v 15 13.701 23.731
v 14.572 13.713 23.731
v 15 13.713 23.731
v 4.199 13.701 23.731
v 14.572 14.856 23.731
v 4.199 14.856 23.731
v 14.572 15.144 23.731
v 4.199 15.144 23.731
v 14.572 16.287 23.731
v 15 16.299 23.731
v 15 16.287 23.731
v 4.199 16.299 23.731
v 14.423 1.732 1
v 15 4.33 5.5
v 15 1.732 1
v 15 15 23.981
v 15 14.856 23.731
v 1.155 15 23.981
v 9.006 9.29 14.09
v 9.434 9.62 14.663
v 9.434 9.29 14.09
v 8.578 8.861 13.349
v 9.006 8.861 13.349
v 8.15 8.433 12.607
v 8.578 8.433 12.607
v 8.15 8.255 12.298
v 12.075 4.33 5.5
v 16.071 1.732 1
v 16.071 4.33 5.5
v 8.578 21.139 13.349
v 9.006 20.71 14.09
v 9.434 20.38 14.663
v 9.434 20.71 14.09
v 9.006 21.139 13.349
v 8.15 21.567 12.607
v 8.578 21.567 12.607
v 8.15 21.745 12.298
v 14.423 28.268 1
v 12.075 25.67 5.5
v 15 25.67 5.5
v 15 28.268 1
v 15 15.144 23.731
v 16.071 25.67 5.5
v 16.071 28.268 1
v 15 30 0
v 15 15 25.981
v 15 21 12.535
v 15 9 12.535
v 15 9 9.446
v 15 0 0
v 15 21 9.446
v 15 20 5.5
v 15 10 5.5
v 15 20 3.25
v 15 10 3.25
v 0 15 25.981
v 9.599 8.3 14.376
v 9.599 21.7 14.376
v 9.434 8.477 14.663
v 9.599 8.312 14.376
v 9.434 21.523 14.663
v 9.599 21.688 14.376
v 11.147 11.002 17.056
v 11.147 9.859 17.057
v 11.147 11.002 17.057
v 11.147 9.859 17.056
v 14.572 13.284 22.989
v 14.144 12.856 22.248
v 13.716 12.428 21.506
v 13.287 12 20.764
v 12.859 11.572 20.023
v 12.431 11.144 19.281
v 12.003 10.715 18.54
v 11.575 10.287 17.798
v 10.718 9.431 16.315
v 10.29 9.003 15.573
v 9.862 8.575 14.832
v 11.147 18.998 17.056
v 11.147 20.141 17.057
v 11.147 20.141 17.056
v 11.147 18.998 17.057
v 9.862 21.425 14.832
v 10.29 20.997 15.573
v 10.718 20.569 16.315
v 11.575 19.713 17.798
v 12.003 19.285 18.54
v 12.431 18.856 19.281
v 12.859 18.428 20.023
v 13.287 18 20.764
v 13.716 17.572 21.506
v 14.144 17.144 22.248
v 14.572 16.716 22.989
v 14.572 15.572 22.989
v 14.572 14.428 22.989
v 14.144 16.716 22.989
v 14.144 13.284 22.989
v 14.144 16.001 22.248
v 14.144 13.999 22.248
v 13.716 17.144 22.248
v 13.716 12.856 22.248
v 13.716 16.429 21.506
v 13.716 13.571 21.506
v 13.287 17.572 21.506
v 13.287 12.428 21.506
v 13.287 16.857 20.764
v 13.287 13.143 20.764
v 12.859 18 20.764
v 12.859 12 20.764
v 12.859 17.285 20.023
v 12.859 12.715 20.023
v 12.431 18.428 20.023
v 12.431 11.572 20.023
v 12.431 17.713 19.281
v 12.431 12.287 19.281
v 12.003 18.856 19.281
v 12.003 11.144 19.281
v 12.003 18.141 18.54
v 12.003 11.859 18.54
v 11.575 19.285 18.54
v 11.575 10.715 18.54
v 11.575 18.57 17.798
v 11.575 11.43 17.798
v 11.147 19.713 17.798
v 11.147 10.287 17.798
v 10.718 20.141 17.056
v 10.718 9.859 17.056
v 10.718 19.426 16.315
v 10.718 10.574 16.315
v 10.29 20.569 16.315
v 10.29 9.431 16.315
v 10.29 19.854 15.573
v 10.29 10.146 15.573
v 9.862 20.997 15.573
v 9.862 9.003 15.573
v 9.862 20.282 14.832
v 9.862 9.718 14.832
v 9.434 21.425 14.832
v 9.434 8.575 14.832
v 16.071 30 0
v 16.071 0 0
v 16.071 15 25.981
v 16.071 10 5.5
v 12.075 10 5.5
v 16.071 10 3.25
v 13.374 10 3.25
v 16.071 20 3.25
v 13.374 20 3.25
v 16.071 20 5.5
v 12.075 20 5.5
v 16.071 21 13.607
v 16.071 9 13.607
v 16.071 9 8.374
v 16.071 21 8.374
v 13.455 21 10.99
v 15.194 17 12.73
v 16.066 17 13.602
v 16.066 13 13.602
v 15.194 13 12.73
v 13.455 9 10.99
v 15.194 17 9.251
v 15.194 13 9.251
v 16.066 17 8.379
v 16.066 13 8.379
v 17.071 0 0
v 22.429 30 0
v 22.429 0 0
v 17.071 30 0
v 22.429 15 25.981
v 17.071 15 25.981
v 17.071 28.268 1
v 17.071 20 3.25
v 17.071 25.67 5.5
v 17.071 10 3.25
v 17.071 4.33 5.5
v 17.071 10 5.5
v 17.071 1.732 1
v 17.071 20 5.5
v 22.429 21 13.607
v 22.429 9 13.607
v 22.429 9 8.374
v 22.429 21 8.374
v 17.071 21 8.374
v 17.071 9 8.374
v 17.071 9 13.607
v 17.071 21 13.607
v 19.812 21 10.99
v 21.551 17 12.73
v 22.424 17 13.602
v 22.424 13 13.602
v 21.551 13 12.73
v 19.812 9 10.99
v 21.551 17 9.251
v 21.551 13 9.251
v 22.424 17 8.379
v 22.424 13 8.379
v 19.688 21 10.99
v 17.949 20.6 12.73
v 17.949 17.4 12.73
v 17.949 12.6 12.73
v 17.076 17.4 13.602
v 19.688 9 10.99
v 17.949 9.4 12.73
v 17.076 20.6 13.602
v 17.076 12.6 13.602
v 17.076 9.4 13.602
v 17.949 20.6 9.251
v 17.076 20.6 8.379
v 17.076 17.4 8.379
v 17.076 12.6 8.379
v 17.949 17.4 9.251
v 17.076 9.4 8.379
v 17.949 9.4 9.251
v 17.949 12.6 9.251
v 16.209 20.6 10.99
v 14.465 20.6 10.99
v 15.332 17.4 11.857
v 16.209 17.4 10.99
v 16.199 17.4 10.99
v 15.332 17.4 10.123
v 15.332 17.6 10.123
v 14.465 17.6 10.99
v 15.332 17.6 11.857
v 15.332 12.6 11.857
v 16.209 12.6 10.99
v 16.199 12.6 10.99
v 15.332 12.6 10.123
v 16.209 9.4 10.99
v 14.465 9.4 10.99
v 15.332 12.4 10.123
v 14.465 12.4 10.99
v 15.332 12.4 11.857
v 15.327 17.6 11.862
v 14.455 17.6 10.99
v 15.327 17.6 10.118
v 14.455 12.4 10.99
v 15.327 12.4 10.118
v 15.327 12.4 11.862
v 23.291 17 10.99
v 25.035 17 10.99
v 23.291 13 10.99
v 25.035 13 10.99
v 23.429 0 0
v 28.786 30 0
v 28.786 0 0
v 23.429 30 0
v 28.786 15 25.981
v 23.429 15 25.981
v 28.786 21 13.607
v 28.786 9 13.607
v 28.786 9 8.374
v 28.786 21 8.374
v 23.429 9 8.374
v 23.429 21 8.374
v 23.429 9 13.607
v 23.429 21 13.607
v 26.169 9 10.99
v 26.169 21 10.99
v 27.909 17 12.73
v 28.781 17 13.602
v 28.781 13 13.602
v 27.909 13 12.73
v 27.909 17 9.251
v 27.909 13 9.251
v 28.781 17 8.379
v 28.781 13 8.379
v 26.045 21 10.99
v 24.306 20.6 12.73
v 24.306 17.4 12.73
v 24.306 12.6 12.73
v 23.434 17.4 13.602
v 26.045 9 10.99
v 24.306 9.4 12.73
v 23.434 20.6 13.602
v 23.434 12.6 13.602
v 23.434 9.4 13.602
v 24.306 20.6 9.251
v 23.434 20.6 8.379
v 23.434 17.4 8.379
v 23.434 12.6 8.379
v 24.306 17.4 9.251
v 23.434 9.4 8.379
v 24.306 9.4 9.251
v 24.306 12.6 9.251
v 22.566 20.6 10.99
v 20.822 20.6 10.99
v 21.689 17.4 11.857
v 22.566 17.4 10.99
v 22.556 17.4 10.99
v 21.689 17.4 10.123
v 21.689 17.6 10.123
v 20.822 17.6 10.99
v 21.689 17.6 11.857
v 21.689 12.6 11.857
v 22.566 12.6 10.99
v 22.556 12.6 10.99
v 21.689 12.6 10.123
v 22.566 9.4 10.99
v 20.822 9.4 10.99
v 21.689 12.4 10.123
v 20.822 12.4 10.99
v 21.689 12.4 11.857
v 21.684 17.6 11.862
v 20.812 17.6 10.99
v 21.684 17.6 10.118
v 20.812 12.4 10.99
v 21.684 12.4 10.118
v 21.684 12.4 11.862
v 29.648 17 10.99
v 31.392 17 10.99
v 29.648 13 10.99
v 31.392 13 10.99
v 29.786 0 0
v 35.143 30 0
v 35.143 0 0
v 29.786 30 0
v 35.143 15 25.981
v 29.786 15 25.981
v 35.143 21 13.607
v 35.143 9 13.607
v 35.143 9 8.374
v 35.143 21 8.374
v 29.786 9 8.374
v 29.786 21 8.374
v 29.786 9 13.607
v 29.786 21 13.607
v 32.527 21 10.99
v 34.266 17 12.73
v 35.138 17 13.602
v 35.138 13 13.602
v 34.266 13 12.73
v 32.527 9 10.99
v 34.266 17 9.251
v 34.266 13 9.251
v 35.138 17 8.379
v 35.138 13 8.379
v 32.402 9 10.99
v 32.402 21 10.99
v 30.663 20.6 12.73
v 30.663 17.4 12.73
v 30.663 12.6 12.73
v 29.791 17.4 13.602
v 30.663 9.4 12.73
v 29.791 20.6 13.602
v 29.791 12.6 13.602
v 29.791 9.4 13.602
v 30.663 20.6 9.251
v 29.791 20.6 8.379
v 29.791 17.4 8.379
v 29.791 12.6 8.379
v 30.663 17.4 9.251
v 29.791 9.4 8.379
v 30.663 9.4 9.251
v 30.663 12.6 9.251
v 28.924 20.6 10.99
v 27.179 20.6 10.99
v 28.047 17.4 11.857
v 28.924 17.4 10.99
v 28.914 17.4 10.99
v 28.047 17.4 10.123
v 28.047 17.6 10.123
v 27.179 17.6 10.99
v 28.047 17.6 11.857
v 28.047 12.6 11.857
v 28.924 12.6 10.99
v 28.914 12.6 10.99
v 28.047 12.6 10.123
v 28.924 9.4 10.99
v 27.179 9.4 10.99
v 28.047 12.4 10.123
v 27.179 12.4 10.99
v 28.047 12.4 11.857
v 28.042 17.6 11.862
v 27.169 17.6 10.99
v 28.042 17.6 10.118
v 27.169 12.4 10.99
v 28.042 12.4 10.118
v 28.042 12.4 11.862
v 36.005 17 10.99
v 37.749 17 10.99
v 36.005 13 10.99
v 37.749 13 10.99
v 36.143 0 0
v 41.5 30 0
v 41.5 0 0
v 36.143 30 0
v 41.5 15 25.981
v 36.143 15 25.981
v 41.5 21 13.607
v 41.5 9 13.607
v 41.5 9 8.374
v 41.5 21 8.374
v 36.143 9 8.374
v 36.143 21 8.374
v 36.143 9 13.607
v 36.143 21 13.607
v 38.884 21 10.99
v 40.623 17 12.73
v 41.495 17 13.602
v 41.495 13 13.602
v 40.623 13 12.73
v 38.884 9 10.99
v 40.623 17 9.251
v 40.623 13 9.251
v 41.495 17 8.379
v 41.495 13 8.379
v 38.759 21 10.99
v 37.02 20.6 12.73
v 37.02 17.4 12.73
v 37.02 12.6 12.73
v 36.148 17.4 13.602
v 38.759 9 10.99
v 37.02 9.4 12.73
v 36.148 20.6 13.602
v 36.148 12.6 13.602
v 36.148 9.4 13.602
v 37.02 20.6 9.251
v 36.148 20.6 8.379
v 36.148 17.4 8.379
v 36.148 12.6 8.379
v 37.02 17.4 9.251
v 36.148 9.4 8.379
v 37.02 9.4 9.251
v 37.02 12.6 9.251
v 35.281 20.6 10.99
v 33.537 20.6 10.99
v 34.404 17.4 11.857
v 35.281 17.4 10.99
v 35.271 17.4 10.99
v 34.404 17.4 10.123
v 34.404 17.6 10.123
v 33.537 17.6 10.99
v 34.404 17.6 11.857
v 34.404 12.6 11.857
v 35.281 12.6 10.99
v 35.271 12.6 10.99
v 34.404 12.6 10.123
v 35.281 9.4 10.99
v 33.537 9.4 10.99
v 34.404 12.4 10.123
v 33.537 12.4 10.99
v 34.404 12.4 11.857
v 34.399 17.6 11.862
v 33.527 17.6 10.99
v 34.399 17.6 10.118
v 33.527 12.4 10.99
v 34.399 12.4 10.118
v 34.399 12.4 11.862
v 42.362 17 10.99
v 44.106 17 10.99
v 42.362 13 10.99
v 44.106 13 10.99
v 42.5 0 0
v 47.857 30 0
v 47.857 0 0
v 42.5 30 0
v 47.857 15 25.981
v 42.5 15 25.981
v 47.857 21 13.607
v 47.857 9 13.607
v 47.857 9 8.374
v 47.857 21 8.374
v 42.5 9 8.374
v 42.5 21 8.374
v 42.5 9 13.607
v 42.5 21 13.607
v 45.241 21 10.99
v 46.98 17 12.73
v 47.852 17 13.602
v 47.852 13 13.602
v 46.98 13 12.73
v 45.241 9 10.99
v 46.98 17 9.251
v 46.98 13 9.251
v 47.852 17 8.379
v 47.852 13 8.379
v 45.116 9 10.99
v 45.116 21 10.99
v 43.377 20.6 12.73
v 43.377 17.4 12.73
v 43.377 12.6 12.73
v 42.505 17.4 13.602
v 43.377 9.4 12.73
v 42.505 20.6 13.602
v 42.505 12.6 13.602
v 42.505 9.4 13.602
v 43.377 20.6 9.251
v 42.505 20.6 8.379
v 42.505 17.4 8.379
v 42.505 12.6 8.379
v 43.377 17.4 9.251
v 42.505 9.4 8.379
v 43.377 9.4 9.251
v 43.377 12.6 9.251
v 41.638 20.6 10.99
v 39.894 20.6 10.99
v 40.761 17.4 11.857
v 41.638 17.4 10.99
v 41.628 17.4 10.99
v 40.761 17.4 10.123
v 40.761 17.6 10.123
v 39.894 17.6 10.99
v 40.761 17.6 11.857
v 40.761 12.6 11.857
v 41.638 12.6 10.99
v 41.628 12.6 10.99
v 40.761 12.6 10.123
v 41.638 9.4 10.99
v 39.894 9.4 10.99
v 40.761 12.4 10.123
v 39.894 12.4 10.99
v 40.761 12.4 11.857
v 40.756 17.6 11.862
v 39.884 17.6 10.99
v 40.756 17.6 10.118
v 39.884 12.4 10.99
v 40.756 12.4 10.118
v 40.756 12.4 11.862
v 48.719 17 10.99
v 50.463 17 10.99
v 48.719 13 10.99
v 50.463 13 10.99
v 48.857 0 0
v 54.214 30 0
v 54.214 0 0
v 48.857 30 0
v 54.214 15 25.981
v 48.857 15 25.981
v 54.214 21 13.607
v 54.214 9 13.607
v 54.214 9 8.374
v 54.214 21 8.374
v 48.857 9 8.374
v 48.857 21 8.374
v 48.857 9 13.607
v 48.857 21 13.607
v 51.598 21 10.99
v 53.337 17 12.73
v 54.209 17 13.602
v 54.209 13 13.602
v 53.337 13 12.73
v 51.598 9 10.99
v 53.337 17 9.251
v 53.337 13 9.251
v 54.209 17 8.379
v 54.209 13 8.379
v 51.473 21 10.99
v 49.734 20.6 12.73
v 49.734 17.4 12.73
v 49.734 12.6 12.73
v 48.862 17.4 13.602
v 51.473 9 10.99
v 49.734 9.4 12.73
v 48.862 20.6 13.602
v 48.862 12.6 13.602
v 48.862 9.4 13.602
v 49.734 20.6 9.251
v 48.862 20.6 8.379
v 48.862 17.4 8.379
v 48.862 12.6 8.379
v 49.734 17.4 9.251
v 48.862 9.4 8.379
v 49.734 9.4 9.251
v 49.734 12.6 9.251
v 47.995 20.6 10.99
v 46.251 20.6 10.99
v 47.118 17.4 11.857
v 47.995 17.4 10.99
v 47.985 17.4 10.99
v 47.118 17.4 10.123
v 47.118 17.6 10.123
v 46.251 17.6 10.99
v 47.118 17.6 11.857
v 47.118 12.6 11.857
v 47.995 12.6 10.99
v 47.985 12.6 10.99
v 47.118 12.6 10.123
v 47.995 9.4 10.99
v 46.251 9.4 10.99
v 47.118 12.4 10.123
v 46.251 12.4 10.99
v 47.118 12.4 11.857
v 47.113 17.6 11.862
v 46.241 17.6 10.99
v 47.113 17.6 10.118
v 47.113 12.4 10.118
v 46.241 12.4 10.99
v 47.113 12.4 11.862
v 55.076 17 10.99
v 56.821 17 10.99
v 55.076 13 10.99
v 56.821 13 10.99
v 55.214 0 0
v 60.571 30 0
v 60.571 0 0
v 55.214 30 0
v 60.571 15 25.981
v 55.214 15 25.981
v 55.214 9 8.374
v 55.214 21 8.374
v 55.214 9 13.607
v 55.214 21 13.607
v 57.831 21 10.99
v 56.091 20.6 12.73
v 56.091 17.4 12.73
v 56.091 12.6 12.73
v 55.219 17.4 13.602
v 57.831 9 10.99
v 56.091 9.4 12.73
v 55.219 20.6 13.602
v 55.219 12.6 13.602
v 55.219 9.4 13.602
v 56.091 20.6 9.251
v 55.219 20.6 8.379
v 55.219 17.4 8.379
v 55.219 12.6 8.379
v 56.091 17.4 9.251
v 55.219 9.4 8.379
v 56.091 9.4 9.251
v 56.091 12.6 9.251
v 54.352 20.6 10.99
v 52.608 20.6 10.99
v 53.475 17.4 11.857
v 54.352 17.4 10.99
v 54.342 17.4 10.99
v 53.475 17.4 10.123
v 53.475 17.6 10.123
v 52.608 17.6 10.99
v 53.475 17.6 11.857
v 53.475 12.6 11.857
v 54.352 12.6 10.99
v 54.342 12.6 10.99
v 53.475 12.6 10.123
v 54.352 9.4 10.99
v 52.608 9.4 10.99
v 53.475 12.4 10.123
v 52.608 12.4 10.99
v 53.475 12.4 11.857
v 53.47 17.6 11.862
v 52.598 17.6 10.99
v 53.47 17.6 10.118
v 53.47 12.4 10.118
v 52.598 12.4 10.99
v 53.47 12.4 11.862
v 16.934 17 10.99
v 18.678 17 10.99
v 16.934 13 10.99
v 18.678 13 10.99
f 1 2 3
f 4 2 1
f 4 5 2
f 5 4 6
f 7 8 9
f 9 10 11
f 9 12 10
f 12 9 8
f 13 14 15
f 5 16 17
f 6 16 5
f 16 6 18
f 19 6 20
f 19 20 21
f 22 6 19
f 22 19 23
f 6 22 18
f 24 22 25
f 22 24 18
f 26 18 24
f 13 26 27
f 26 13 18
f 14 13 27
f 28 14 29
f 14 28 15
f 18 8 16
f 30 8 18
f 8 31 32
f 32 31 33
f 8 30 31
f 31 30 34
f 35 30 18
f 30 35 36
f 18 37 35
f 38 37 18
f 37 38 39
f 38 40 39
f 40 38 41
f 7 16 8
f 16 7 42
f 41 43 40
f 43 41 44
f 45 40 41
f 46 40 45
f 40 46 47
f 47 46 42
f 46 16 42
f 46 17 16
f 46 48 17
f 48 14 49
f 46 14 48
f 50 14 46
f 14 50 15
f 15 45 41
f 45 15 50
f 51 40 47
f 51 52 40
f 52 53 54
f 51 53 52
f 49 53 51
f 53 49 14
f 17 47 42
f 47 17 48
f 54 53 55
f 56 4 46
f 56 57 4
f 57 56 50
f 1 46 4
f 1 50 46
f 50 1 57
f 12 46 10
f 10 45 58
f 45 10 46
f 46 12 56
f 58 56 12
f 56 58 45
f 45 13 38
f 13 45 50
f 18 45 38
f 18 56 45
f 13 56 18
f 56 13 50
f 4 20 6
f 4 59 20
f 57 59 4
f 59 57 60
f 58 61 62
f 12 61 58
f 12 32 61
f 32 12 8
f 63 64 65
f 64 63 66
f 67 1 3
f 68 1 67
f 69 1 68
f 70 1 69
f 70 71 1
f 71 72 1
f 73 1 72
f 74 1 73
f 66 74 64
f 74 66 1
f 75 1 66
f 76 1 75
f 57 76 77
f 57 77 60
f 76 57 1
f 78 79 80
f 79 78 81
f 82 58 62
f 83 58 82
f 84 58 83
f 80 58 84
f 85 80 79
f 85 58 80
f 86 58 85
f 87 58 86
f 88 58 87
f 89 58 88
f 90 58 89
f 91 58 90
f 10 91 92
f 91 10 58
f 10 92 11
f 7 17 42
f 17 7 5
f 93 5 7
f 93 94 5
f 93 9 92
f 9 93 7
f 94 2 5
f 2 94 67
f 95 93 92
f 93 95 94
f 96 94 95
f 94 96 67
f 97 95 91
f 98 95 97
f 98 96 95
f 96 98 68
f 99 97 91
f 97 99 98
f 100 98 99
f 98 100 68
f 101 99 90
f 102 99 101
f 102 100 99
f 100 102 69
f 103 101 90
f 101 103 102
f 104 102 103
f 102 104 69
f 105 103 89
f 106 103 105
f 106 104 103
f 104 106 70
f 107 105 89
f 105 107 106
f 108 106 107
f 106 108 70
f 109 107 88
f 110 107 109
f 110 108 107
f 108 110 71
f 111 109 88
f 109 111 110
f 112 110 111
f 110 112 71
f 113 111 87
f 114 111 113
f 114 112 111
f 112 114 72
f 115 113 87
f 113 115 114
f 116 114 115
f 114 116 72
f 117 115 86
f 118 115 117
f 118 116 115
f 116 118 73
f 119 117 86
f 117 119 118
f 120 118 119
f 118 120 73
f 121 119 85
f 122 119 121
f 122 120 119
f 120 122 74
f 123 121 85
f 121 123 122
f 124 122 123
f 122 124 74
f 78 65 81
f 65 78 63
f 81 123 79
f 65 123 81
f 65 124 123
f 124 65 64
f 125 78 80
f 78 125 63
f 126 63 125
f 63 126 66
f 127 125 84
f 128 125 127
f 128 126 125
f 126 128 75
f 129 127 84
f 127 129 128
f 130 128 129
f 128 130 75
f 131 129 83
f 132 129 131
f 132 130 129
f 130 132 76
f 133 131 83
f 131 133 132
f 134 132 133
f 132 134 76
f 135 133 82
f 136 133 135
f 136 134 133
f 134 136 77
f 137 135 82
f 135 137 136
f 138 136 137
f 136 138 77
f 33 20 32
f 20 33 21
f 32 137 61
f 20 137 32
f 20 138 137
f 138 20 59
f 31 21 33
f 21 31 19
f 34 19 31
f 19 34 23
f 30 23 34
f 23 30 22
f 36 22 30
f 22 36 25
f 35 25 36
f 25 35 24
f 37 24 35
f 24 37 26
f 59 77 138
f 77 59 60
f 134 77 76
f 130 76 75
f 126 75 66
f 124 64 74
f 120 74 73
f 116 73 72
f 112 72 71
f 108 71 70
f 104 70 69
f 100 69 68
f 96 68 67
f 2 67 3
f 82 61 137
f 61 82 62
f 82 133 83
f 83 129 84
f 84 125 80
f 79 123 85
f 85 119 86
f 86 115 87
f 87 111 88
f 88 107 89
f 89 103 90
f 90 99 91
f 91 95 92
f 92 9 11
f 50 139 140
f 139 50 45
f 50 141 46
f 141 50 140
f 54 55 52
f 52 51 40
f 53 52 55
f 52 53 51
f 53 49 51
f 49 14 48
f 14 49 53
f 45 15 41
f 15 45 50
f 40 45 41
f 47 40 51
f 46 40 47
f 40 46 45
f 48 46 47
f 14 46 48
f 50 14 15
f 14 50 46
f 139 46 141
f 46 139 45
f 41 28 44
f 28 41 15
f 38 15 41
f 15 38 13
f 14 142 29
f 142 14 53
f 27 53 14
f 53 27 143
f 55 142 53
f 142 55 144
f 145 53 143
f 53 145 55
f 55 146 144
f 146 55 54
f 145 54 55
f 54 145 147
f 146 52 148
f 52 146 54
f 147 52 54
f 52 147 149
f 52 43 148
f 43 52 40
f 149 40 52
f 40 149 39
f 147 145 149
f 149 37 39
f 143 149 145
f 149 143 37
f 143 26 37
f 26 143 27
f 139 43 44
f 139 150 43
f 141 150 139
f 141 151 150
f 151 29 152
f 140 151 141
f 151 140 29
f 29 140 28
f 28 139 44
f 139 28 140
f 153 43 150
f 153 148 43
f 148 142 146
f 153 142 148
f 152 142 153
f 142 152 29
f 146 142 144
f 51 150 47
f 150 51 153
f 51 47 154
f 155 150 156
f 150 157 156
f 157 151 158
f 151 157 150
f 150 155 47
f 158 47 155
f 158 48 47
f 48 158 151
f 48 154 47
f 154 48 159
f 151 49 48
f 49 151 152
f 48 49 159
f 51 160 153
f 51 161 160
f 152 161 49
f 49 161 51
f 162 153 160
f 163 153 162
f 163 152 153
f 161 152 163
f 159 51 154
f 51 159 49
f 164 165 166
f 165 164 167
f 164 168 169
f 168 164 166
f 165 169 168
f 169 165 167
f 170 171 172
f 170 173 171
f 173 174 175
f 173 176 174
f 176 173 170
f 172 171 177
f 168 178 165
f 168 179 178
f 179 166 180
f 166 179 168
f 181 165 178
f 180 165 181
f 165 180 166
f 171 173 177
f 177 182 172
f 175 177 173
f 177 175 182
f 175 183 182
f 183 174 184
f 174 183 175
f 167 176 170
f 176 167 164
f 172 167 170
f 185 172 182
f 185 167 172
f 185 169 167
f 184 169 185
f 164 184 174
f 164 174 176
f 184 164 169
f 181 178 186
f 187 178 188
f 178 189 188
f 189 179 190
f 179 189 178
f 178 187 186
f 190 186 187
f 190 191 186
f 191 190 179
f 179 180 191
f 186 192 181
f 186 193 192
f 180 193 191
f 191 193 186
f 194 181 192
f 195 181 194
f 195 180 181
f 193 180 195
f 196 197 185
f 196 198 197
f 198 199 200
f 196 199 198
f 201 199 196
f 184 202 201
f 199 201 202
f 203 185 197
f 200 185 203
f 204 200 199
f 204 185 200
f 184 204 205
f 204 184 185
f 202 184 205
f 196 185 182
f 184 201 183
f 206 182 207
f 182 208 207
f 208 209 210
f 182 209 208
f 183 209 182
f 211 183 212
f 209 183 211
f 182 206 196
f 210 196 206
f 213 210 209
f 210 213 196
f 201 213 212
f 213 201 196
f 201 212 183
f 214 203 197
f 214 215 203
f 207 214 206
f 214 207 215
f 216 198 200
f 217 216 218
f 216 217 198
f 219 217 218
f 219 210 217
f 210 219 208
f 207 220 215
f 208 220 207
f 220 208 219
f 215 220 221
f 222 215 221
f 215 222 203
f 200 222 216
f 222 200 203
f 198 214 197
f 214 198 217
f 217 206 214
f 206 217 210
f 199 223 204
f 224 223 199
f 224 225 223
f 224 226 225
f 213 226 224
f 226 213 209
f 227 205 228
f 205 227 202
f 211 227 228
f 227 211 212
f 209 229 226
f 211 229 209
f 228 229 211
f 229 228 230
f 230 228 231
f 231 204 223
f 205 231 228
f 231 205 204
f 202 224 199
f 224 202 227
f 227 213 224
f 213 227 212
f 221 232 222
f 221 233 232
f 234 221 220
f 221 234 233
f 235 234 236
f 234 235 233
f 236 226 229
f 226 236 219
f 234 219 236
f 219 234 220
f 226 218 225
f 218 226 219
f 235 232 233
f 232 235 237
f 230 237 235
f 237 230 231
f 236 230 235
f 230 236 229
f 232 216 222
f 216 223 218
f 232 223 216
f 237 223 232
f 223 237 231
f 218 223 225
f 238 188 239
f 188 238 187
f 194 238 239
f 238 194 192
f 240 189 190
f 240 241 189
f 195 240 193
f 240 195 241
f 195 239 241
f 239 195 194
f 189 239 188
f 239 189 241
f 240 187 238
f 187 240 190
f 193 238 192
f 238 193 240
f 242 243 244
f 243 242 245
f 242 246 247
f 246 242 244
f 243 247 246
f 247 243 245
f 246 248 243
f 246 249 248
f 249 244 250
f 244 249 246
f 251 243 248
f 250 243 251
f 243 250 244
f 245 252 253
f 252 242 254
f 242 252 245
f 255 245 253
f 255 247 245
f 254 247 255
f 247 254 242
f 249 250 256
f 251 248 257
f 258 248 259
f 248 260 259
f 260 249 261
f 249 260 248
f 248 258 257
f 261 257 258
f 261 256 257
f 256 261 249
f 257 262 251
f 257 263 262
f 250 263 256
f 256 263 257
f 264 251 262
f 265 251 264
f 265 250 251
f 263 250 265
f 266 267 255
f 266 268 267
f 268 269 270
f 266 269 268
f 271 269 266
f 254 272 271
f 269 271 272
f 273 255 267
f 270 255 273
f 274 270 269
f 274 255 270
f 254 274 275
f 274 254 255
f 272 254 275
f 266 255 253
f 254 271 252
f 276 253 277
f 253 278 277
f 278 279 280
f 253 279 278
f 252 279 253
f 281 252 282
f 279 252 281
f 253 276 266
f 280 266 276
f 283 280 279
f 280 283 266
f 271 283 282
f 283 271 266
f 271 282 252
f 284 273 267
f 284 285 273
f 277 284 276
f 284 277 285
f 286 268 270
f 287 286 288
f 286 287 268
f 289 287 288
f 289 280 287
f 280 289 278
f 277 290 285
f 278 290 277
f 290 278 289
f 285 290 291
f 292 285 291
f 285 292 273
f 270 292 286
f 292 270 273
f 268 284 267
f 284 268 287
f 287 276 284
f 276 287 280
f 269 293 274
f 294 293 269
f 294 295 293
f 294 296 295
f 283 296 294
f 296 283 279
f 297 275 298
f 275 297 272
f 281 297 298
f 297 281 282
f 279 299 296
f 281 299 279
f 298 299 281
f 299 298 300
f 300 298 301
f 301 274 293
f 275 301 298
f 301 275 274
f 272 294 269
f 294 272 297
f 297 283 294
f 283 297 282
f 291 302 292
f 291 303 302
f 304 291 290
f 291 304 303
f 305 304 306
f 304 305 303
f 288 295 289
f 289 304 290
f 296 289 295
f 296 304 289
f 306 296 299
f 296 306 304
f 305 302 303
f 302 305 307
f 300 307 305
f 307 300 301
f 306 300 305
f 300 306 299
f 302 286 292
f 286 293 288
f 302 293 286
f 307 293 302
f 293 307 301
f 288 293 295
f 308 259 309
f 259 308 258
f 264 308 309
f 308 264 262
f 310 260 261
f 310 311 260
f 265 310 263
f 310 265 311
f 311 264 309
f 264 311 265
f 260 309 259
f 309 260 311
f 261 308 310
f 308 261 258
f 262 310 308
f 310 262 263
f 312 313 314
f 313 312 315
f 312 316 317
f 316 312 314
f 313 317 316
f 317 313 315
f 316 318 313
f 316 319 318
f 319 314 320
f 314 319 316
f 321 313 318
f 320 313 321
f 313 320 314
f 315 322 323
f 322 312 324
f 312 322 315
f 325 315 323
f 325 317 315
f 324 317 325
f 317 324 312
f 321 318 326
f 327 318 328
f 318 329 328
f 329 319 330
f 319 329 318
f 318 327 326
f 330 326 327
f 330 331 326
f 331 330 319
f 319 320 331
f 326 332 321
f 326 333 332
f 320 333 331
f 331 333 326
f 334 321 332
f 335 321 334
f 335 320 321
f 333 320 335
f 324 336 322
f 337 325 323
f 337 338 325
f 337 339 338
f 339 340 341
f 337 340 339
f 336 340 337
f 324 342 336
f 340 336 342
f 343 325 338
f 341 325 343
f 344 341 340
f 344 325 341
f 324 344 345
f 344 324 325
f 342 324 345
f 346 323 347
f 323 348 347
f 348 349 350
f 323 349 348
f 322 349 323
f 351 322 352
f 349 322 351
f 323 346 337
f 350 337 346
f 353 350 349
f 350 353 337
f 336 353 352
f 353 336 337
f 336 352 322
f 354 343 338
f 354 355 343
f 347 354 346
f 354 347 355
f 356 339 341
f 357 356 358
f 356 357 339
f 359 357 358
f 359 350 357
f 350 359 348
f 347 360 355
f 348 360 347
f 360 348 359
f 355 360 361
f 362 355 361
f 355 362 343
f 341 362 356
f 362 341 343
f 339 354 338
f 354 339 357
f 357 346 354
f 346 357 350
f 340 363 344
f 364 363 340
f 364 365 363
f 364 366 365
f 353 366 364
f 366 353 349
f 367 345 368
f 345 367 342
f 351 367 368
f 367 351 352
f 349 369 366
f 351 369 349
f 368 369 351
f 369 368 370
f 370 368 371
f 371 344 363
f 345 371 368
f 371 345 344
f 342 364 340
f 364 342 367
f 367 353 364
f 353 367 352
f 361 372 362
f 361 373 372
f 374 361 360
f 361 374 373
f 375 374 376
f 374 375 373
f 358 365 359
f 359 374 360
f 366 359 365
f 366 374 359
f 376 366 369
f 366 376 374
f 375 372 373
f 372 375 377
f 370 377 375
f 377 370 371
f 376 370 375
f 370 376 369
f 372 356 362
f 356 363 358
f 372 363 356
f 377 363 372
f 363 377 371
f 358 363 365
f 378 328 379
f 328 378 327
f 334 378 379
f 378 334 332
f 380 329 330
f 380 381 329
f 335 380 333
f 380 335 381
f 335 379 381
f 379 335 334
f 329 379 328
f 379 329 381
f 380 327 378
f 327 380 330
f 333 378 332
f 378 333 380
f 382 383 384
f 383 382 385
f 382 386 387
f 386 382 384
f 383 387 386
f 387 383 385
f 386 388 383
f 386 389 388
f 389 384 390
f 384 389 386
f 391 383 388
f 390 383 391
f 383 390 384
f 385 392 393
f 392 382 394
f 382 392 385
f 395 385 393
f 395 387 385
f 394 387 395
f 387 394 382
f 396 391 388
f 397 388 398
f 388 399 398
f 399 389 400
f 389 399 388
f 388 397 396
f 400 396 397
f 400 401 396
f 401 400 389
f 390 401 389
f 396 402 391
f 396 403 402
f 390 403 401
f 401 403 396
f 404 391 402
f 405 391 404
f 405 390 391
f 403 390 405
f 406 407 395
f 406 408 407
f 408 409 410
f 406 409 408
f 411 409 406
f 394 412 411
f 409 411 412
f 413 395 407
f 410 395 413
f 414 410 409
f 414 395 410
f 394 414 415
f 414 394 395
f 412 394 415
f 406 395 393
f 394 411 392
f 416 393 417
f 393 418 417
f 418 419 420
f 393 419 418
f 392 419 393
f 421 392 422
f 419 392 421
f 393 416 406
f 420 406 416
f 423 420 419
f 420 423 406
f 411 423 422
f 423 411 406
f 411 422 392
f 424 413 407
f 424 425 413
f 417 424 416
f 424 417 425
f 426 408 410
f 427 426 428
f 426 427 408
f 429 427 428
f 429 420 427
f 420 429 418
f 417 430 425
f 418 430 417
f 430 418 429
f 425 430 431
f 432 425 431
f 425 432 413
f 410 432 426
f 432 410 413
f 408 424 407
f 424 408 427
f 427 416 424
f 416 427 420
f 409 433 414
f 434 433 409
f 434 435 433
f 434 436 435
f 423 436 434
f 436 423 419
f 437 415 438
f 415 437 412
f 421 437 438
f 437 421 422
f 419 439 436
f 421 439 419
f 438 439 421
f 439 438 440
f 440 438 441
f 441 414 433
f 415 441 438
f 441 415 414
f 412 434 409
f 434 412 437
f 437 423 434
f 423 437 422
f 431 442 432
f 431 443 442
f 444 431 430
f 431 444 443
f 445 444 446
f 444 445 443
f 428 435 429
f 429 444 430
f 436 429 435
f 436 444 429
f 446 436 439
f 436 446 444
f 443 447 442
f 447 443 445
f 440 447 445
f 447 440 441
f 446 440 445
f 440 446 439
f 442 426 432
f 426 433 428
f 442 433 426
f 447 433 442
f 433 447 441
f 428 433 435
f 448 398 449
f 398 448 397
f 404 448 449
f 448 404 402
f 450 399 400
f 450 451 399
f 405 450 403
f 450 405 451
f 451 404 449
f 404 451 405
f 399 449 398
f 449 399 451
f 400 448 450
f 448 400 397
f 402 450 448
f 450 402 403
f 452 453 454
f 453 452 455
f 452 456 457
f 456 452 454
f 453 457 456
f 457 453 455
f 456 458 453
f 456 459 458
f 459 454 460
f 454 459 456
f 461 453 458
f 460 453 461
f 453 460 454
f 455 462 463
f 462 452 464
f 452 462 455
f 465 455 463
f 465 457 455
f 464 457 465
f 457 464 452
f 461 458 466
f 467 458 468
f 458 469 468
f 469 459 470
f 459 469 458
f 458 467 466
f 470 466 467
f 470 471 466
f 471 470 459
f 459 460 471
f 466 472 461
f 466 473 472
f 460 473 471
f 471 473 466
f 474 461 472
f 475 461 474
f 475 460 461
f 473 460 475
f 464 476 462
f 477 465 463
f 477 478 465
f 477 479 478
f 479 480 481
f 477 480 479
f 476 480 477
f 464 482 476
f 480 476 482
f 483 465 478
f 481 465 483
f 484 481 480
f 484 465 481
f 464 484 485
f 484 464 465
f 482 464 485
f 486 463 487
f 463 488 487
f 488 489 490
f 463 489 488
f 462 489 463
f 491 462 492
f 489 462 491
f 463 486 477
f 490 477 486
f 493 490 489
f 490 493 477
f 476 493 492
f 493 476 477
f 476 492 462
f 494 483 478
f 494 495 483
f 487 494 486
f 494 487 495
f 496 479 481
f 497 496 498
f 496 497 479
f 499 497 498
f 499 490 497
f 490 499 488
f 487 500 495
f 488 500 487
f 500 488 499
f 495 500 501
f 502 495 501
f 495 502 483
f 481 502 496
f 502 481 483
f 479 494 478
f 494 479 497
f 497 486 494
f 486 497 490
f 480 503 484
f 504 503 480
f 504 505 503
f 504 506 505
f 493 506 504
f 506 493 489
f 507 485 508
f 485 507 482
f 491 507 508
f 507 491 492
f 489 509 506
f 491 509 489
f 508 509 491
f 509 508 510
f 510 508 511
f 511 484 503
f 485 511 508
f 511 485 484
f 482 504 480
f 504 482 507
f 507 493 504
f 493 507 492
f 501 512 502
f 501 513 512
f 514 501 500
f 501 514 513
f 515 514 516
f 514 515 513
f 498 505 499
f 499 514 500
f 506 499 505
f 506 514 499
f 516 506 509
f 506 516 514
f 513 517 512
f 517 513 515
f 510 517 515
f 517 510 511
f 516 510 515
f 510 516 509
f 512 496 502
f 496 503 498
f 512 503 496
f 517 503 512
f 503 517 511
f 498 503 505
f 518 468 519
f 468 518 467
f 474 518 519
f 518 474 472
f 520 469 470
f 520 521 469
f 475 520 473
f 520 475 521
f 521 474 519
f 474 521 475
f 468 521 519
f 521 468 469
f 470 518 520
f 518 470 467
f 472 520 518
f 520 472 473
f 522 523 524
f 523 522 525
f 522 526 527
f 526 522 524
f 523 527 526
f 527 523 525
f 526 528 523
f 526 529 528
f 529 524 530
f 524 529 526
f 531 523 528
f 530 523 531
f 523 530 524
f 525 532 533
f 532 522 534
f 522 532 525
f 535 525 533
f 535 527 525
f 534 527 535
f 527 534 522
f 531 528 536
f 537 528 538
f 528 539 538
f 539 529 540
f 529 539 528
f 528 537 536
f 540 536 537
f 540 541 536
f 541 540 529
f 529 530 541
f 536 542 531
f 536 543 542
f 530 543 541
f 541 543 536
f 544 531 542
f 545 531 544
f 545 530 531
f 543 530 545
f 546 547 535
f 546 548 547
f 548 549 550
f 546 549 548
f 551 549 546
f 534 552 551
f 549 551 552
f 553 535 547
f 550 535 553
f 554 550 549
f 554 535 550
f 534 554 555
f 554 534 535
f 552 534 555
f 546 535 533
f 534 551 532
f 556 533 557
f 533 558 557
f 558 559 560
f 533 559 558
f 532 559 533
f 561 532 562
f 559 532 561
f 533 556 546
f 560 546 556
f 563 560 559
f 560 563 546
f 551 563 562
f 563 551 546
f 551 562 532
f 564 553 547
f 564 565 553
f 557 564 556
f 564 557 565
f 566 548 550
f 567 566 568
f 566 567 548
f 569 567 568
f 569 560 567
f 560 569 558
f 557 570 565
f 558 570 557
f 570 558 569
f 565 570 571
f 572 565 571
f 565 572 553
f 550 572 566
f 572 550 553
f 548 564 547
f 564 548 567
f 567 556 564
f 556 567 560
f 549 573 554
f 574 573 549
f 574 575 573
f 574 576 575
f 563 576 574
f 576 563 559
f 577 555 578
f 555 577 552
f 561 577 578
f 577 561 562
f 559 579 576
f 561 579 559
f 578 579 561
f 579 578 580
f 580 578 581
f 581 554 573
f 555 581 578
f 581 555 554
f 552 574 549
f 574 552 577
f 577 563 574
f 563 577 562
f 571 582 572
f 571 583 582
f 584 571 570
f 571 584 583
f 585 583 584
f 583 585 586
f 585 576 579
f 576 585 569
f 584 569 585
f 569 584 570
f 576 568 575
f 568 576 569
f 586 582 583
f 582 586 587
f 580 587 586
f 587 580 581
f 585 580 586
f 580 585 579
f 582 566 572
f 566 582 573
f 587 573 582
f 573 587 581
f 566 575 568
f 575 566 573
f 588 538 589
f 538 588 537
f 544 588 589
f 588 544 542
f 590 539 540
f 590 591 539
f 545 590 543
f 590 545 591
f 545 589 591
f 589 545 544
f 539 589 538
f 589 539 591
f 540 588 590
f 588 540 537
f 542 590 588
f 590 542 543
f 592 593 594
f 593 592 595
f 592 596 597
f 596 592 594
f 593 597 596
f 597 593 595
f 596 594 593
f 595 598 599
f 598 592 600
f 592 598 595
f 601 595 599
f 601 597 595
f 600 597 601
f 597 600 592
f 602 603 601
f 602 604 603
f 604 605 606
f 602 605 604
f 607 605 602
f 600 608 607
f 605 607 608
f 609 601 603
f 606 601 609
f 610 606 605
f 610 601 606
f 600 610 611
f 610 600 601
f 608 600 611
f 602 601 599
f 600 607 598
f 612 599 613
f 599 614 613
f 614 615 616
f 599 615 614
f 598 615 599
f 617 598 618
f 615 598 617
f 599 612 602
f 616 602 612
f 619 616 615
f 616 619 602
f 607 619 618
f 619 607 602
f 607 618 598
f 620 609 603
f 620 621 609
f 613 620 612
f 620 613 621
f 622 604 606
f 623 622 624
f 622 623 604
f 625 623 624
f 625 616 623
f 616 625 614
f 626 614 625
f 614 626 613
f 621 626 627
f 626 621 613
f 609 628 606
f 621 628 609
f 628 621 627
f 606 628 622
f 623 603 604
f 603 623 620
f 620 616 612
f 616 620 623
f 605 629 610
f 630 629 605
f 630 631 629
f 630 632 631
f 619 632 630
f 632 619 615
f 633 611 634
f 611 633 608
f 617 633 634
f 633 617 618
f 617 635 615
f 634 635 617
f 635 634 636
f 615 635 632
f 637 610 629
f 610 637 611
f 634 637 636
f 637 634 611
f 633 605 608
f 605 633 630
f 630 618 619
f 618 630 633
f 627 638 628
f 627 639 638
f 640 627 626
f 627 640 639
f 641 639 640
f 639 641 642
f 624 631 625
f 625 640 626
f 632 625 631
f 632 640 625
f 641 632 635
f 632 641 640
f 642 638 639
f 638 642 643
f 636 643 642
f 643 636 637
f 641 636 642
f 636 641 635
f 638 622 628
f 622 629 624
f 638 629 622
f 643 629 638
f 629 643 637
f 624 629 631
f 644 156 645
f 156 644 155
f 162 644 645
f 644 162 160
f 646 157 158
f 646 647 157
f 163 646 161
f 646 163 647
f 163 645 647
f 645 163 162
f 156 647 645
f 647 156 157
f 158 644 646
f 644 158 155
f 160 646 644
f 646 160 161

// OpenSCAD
// file: flexi.scad
*difference() {
    cube([25,12*2+6,7]);
    translate([15,0,0])
    rotate(90,[0,0,1])
    flexi(4, 2, 14, 2, 12, 5, 6, 7, 2.75, 1);
};

*flexi2([40,40,10], 4, 10, 10/2, 10, centers=[[0,0,0],[0,0,0]])
cube([40,40,10]);

module flexi(a, b, c, d, e, f, g, h, j, k) {
    difference() {
        // canyon
        translate([-0.01,0,-0.01])
        linear_extrude(h + 0.02)
        polygon([
        [0,0],
        [0,d],
        [e,d],
        [e,d + f],
        [e + g, d + f],
        [e + g, d],
        [e*2 + g + 0.02, d],
        [e*2 + g + 0.02, 0],
        ]);
        
        //rod-grabber
        translate([g+e-k,d+h/2,h])
        rotate(90,[0,1,0])
        rotate(180,[1,0,0])
        linear_extrude(g - k*2)
        difference() {
            square([h,f*2]);
            translate([h/2,h/2])
            circle(j);
        };
        
        // rod
        translate([e + g/2 - c/2, d, h/2])
        rotate(90,[0,1,0])
        translate([0,0,c/2])
        scale([1,0.75,1])
        translate([0,0,-c/2])
        rotate_extrude(angle= 360)
        polygon([
            [0,0],
            [b,a],
            [b,c - a],
            [0,c],
            ]);
    };
};

module flexi2(dim, steps, gap, hs, hw, center = [0,0,0], strips, centers) {
    sdim = [dim.x/steps,dim.y,dim.z];
//    hs = dim.z/2;
//    hw = dim.y/4;
    strips = (strips)?strips:[for(i =[0:sdim.x:sdim.x*steps]) i];
    for(step = [0:steps - 1]) {
        translate([step*gap,0,0])
        difference() {
            intersection() {
                children(0);
                translate([strips[step],0,0])
                cube([strips[step+1] - strips[step], sdim.y, sdim.z]);
            }
            translate(center)
            {
                // left gap
                translate((centers[step])?centers[step]:[0,0,0])
                if(step < steps - 1) {
                    translate([strips[step],0,0])
                    translate([-hs*cos(45) + strips[step + 1] - strips[step], hw*3/2 + sdim.y/2, sdim.z/2])
                    rotate(45,[0,1,0])
                    rotate(90,[1,0,0])
                    linear_extrude(hw*3)
                    square([hs,hs]);
                }
                // right gap
                translate((centers[step-1])?centers[step-1]:[0,0,0])
                if(step > 0) {
                    translate([strips[step],0,0])
                    translate([-hs*cos(45), hw*3/2 + sdim.y/2, sdim.z/2])
                    rotate(45,[0,1,0])
                    rotate(90,[1,0,0])
                    linear_extrude(hw*3)
                    square([hs,hs]);
                }
            }
        }
        translate([strips[step] + gap*step,0,0])
        translate(center) {
            // left hook
            translate((centers[step])?centers[step]:[0,0,0])
            if(step < steps - 1) {
                translate([-hs*cos(45) + strips[step + 1] - strips[step] - 0.01, hw*3/2 + sdim.y/2 - hw, sdim.z/2])
                rotate(45,[0,1,0])
                rotate(90,[1,0,0])
                linear_extrude(hw)
                difference() {
                    square([hs,hs]);
                    //translate([hs/2/2,hs/2/2])
                    square([hs/1.5,hs/1.5]);
                }
            }
            // right hooks plus bridge
            translate((centers[step-1])?centers[step-1]:[0,0,0])
            if(step > 0) {
                translate([hs*cos(45) + 0.01, hw*3/2 + sdim.y/2, sdim.z/2])
                mirror([1,0,0])
                rotate(45,[0,1,0])
                rotate(90,[1,0,0])
                translate([0,0,hw*.1])
                linear_extrude(hw*.8)
                difference() {
                    square([hs,hs]);
                    //translate([hs/2/2,hs/2/2])
                    square([hs/1.5,hs/1.5]);
                }
                translate([hs*cos(45) + 0.01, hw*3/2 + sdim.y/2 - hw*2, sdim.z/2])
                mirror([1,0,0])
                rotate(45,[0,1,0])
                rotate(90,[1,0,0])
                translate([0,0,hw*.1])
                linear_extrude(hw*.8)
                difference() {
                    square([hs,hs]);
                    //translate([hs/2/2,hs/2/2])
                    square([hs/1.5,hs/1.5]);
                }
                translate([-cos(45)*(hs - hs/1.5), hw*3/2 + sdim.y/2 - hw + hw*0.05, sdim.z/2])
                mirror([1,0,0])
                rotate(45,[0,1,0])
                rotate(90,[1,0,0])
                translate([0,0,-hw*.1])
                linear_extrude(hw*1.3)
                difference() {
                    square([hs - hs/1.5,hs - hs/1.5]);
                    //translate([hs/2/2,hs/2/2])
                    //square([hs/1.5,hs/1.5]);
                }
            }
        }
    }
    
    *translate([sdim.x - hs*cos(45), hs/2 + sdim.y/2 - hw/2, sdim.z/2])
    rotate(45,[0,1,0])
    rotate(90,[1,0,0])
    linear_extrude(hw)
    difference() {
        square([hs,hs]);
        //translate([hs/2/2,hs/2/2])
        square([hs/1.5,hs/1.5]);
    }
}
// main file
include <flexi.scad>

// handy flags
_BALCONIES = false;
_WINDOWS = false;
_VOID = false;

// floor counts
botfl = 8;

// outer wall length
length = 30;
// depth from point to back wall
depth = cos(30)*length;
// the top makes a 30 degree angle from back to the point
top_size = depth*tan(30);
top_hole_steps = 16;
top_hole_nose_inset = top_size*3/20;
top_hole_size = top_size - top_hole_nose_inset*(1+cos(30));
top_perimeter_wall = max(length/50, 1);

// floor size
fs = top_size / 2.8;

corner_whi = fs/3;
corner_win = 1.5;
corner_wout =  1.1;

void_taper = 0;
// let the taper grow up as long as we don't hit the balcony
void_taper_gains = -fs/2;
//void_taper_gains = (top_hole_nose_inset*2 - top_perimeter_wall)*tan(void_taper) - fs*0.2 - top_perimeter_wall;
//void_taper_gains = fs*0.75;


window_depth = min(top_perimeter_wall/3,.5);

echo(top_size, top_hole_size, top_hole_nose_inset, top_perimeter_wall, window_depth);

// left middle right facing point
// top down yeehaw
corners = [
    [1,"wwb"],
    [2,"bbb"],
    [3,"bww"],
    [4," w "],
    ];

// Windows by side, floor, [pos, type], pos is %, see winrow for types
windows = [
        [ 0,
            [
            [1, [[8,76],[1,69],[1,62],[7,51],[7,44],[2,35],[2,28],[7,12]
                ]],
            [2, [[4,78],[5,63],[7,55],[7,48],[7,41],[5,33],[1,22]
                ]],
            [3, [[2,83],[4,75],[5,66],[7,55],[7,48],[7,41],[1,32],[8,19]
                ]],
            [4, [[2,88],[1,80],[1,70],[2,64],[4,57],[10,50],[4,42],[1,33],[1,26],[1,18],[1,9]
                ]],
            //[4, [for (i = [0:10]) [0, 10*i+10]]],
            ],
        ],
        [ 120,
            [
            [0, [[0,20],[0,21.5],[0,23],[0,24.5],[0,26],[0,27.5],[0,29],[0,30.5],
                 [1,35],[2,38],[1,43],[3,47]
                ]],
            [1, [[4,10],[4,17],[5,23],[5,37],[5,46],[6,65],[7,82]
                ]],
            [2, [[5,21],[5,34],[4,41],[4,65],[6,76]
                ]],
            [3, [[4,14],[5,20],[5,28],[8,37],[2,46],[8,67],[1,77]
                ]],
            [4, [[1,12],[1,20],[1,31],[1,37],[2,41],[4,48],[1,65],[4,75],[6,80]
                ]],
            //[4, [for (i = [0:10]) [0, 10*i+10]]]
            ],
        ],
        [ 240,
            [
            [0, [[0,69.5],[0,71],[0,72.5],[0,74],[0,75.5],[0,77],[0,78.5],[0,80],
                 [4,61],[2,51]
                ]],
            [1, [[5,72],[2,57],[4,52],[2,32],[1,20]
                ]],
            [2, [[1,77],[4,67],[2,59],[5,51],[4,33],[6,16]
                ]],
            [3, [[9,49],[5,31],[1,20]
                ]],
            [4, [[9,49],[1,34],[1,23],[6,10]
                ]],
            //[4, [for (i = [0:10]) [0, 10*i+10]]],
            //[0, [for (i = [0:6]) [i, 10*i+10]]],
            //[1, [for (i = [0:6]) [i, 10*i+10]]]
            ],
        ]
    ];

fdim = [botfl*fs+top_size,length,length*sin(60)];
strips = concat([0],[ for(i = [top_size+fs*0.2:fs:fdim.x]) i ]);
fcenter = [0,0,-2];

echo(strips);
%cube(fdim);
flexi2(fdim, botfl, 1, 3.7, 4, strips=strips, center=fcenter)
translate([botfl*fs+top_size,0,0])
rotate(270,[0,1,0])
difference() {
    union() {
        translate([0,0,botfl*fs])
        top();
        base();
    }
    
    // top balcony
    if(true)
    color("brown")
    translate([0,0,botfl*fs - fs*0.2])
    intersection() {
        linear_extrude(top_size)
        offset(delta=-top_perimeter_wall)
        polygon([[0,0],
        [length*sin(60),length*cos(60)],
        [0,length]]);
        
        linear_extrude(top_size)
        union() {
            translate([0,length/3 * 2])
            square([top_hole_nose_inset*2 + top_perimeter_wall,length/3]);
            square([top_hole_nose_inset*2 + top_perimeter_wall,length/3]);
            square([top_hole_nose_inset + top_perimeter_wall,length]);
        };
    };
    
    // downslope to the balcony
    color("lime")
    translate([0,0,botfl*fs])
    difference() {
        linear_extrude(top_size)
        offset(delta=-top_perimeter_wall)
        polygon([[0,0],
        [length*sin(60),length*cos(60)],
        [0,length]]);
        
        translate([0,0,-top_perimeter_wall/4])
        rotate(60,[0,1,0])
        //translate([-length,0,0])
        cube([length,length,length*2]);
    };
    
    // corners
    if(_BALCONIES)
    for(c = corners) {
        translate([0,0,botfl*fs - fs*c[0]]) {
            corner(c[1][0]);
            translate([length/2/sin(60)*sin(30),length/2/sin(60)*cos(30),0])
            rotate(120,[0,0,1])
            translate([-length/2/sin(60)*sin(30),-length/2/sin(60)*cos(30),0])
            corner(c[1][1]);
            translate([length/2/sin(60)*sin(30),length/2/sin(60)*cos(30),0])
            rotate(240,[0,0,1])
            translate([-length/2/sin(60)*sin(30),-length/2/sin(60)*cos(30),0])
            corner(c[1][2]);
        }
    };
    
    // space-saving void
    if(_VOID)
    translate([0,0,-0.01])
    translate([length/2/sin(60)*sin(30) + top_hole_nose_inset,length/2/sin(60)*cos(30),0])
    //linear_extrude(botfl*fs - fs/2)
    tapertower(botfl*fs + void_taper_gains, length/sin(60)*sin(30), void_taper)
    translate([-length/2/sin(60)*sin(30) - top_hole_nose_inset,-length/2/sin(60)*cos(30),0])
    offset(r=top_perimeter_wall, $fn=20)
    offset(r=-top_perimeter_wall*2)
    polygon([
        [0,top_hole_nose_inset*corner_win],
        [0,length - top_hole_nose_inset*corner_win],
        [top_hole_nose_inset*corner_win*cos(30),
            length - top_hole_nose_inset*corner_win*sin(30)],
        [(length - top_hole_nose_inset*corner_win)*sin(60),
            (length - top_hole_nose_inset*corner_win)*cos(60) + top_hole_nose_inset*corner_win],
        [(length - top_hole_nose_inset*corner_win)*sin(60),
            (length - top_hole_nose_inset*corner_win)*cos(60)],
        [top_hole_nose_inset*corner_win*cos(30),
            top_hole_nose_inset*corner_win*sin(30)],
        ]);
        
    // windows
    if(_WINDOWS)
    for(side = windows) {
        translate([length/2/sin(60)*sin(30),length/2/sin(60)*cos(30),0])
        rotate(side[0],[0,0,1])
        translate([-length/2/sin(60)*sin(30),-length/2/sin(60)*cos(30),0])
        for(wins = side[1]) {
            translate([0,0,fs*(botfl - wins[0])])
            winrow(wins[1]);
        }
    };      
            
}

*tapertower(200, 100, 20)
square([100,100], center=true);

module tapertower(h, w, a) {
    y = w / 2 / sin(90 - a) * sin(a);
    x = h - y;
    translate([0,0,x])
    linear_extrude(y, scale=0)
    children(0);
    linear_extrude(x + 0.01)
    children(0);
}

module cube45(s) {
    *cube(s);
    x = s[1];
    y = s[2];
    z = s[0];
    xscale = max((x - z*2)/x, 0.001);
    yscale = max((y - z*2)/y, 0.001);
    if(xscale <= 0 || yscale <= 0) {
        echo(x, y, z, xscale, yscale);
    }
    rotate(90,[0,0,1])
    rotate(90,[1,0,0])
    translate([x/2, y/2])
    linear_extrude(z, scale=[xscale,yscale])
    translate([-x/2, -y/2])
    square([x,y]);
}

module winrow(ws) {
    for(w = ws) {
        t = w[0];
        pos = w[1];
        translate([0,length*pos/100,0])
        if(t == 0) { // tall thin
            translate([0,0,-fs*2/5/2])
            cube45([window_depth,length*2/400,fs*2/5]);
        } else if(t == 1) { // center narrow
            cube45([window_depth,length*7/400,fs*1/5]);
        } else if(t == 2) { // center medium
            cube45([window_depth,length*15/400,fs*1/5]);
        } else if(t == 3) { // high wide thin
            translate([0,0,fs*2/5/2])
            cube45([window_depth,length*27/400,fs*1/20]);
        } else if(t == 4) { // high narrow
            translate([0,0,fs*1/10])
            cube45([window_depth,length*7/400,fs*1/5]);
        } else if(t == 5) { // center wider
            cube45([window_depth,length*20/400,fs*1/5]);
        } else if(t == 6) { // 4 grid
            //bsize = length*4/400;
            size = fs/2;
            bsize = size/7;
            *translate([0,0,-size/2])
            cube45([window_depth,size,size]);
            translate([0,0,bsize/2])
            translate([0,0,-size/2])
            for(x = [0:bsize*2:size], y = [0:bsize*2:size]) {
                translate([0,x,y])
                cube45([window_depth,bsize,bsize]);
            }
        } else if(t == 7) { // high wider
            translate([0,0,fs*1/5/2])
            cube45([window_depth,length*23/400,fs*1/5]);
        } else if(t == 8) { // high medium
            translate([0,0,fs*1/5/2])
            cube45([window_depth,length*15/400,fs*1/5]);
        } else if(t == 9) { // 19 grid
            //bsize = length*4/400;
            size = fs/2;
            bsize = size/8;
            *translate([0,0,-size/2])
            cube45([window_depth,size,size]);
            translate([0,0,bsize/2])
            translate([0,0,-size/2])
            for(x = [0:bsize*2*.8:bsize*18*2*.8], y = [0:bsize*2:bsize*7]) {
                translate([0,x,y])
                cube45([window_depth,bsize,bsize]);
            }
        } else if(t == 10) { // DOORS
            h = fs*4/10;
            w = fs*3/10;
            translate([0,-w/2,-fs*0.2])
            cube45([window_depth,w,h]);
        }
    }
};
                        

module corner(t) {
    whi = corner_whi;
    win = corner_win;
    wout =  corner_wout;
    if(t != " ") {
        linear_extrude(whi)
        polygon([[-0.01,-0.01],
            [top_hole_nose_inset*0.8*sin(60),top_hole_nose_inset*0.8*cos(60)-0.01],
            [-0.01,top_hole_nose_inset*0.8]]);
    }
    if(t == "b") {
        linear_extrude(whi)
        polygon([[-0.01,top_hole_nose_inset*win],
            [top_hole_nose_inset*win*sin(60),top_hole_nose_inset*win*cos(60)-0.01],
            [top_hole_nose_inset*wout*sin(60),top_hole_nose_inset*wout*cos(60)-0.01],
            [-0.01,top_hole_nose_inset*wout]]);
        color("pink")
        //translate([0,0,-fs/6])
        linear_extrude(whi)
        offset(delta=-top_perimeter_wall/1.2)
        polygon([[0,0],
            [top_hole_nose_inset*win*sin(60),top_hole_nose_inset*win*cos(60)],
            [0,top_hole_nose_inset*win]]);
    }
};

module top() {
    difference() {
        color("blue")
        linear_extrude(top_size)
        polygon([[0,0],
            [length*sin(60),length*cos(60)],
            [0,length]]);
        
        // make a point
        color("red")
        rotate(60,[0,1,0])
        translate([-length,0,0])
        cube([length,length,length*2]);
        
        
        // horizontal hole
        
        color("aqua")
        translate([depth,length,top_hole_size])
        rotate(90,[1,0,0])
        rotate(180,[0,0,1])
        linear_extrude(length)
        translate([top_hole_nose_inset,0,0])
        // center triangle
        polygon([[0,0],
            [top_hole_size*sin(60),top_hole_size*cos(60)],
            [0,top_hole_size]]);

       // horizontal hole top poke
        color("purple")
        intersection() {
            translate([depth,length,length])
            rotate(90,[1,0,0])
            rotate(180,[0,0,1])
            linear_extrude(length)
            translate([top_hole_nose_inset,0,0])
            // center triangle
            polygon([[0,0],
                [length*sin(60),length*cos(60)],
                [0,length]]);
            
            linear_extrude(top_size)
            offset(delta=-top_perimeter_wall)
            polygon([[0,0],
                [length*sin(60),length*cos(60)],
                [0,length]]);
        };  

        // nose chop
        color("brown")
        translate([0,0,-0.01])
        intersection() {
            linear_extrude(top_size)
            offset(delta=-top_perimeter_wall)
            polygon([[0,0],
                [length*sin(60),length*cos(60)],
                [0,length]]);
            
            linear_extrude(top_size)
            translate([depth - top_hole_nose_inset - 0.01,0])
            square([top_hole_nose_inset,length]);
        };
 
        // define the the perimeter wall
        /*
        *
        linear_extrude(top_size)
        offset(delta=-top_perimeter_wall)
        polygon([[0,0],
            [length*sin(60),length*cos(60)],
            [0,length]]);
        */

/*        
        // downslope to the balcony
        color("lime")
        difference() {
            linear_extrude(top_size)
            offset(delta=-top_perimeter_wall)
            polygon([[0,0],
            [length*sin(60),length*cos(60)],
            [0,length]]);
            
            translate([0,0,-top_perimeter_wall/4])
            rotate(60,[0,1,0])
            //translate([-length,0,0])
            cube([length,length,length*2]);
        };
*/ 
 
        /*
        // balcony
        color("tan")
        translate([0,0,-0.01])
        intersection() {
            linear_extrude(top_size)
            offset(delta=-top_perimeter_wall)
            polygon([[0,0],
            [length*sin(60),length*cos(60)],
            [0,length]]);
            
            linear_extrude(top_size)
            union() {
                translate([0,length/3 * 2])
                square([top_hole_nose_inset*2 + top_perimeter_wall,length/3]);
                square([top_hole_nose_inset*2 + top_perimeter_wall,length/3]);
                square([top_hole_nose_inset + top_perimeter_wall,length]);
            };
        }
        */
            
            
    }
    // add stair steps
    step_h = (depth - top_hole_nose_inset)*sin(30)/top_hole_steps;
    step_l = tan(30)*(depth - top_hole_nose_inset)/2/top_hole_steps;
    color("pink")
    intersection() {
        translate([depth - top_hole_nose_inset,length,0])
        rotate(180,[0,0,1])
        for(step = [0:top_hole_steps - 1]) {
            linear_extrude(step_l*(step + 1))
            translate([step_h*step,0])
            square([step_h,length]);
        };
        
        linear_extrude(top_size)
        offset(delta=-0.01)
        polygon([[0,0],
            [length*sin(60),length*cos(60)],
            [0,length]]);
    };
        
}

module base() {
    difference() {
        linear_extrude(botfl*fs)
        polygon([[0,0],[length*sin(60),length*cos(60)],[0,length]]);
/*        
        // balcony dip
        color("brown")
        translate([0,0,botfl*fs - fs/5])
        intersection() {
            linear_extrude(top_size)
            offset(delta=-top_perimeter_wall)
            polygon([[0,0],
            [length*sin(60),length*cos(60)],
            [0,length]]);
            
            linear_extrude(top_size)
            union() {
                translate([0,length/3 * 2])
                square([top_hole_nose_inset*2 + top_perimeter_wall,length/3]);
                square([top_hole_nose_inset*2 + top_perimeter_wall,length/3]);
                square([top_hole_nose_inset + top_perimeter_wall,length]);
            };
        }
        */
    }
}
